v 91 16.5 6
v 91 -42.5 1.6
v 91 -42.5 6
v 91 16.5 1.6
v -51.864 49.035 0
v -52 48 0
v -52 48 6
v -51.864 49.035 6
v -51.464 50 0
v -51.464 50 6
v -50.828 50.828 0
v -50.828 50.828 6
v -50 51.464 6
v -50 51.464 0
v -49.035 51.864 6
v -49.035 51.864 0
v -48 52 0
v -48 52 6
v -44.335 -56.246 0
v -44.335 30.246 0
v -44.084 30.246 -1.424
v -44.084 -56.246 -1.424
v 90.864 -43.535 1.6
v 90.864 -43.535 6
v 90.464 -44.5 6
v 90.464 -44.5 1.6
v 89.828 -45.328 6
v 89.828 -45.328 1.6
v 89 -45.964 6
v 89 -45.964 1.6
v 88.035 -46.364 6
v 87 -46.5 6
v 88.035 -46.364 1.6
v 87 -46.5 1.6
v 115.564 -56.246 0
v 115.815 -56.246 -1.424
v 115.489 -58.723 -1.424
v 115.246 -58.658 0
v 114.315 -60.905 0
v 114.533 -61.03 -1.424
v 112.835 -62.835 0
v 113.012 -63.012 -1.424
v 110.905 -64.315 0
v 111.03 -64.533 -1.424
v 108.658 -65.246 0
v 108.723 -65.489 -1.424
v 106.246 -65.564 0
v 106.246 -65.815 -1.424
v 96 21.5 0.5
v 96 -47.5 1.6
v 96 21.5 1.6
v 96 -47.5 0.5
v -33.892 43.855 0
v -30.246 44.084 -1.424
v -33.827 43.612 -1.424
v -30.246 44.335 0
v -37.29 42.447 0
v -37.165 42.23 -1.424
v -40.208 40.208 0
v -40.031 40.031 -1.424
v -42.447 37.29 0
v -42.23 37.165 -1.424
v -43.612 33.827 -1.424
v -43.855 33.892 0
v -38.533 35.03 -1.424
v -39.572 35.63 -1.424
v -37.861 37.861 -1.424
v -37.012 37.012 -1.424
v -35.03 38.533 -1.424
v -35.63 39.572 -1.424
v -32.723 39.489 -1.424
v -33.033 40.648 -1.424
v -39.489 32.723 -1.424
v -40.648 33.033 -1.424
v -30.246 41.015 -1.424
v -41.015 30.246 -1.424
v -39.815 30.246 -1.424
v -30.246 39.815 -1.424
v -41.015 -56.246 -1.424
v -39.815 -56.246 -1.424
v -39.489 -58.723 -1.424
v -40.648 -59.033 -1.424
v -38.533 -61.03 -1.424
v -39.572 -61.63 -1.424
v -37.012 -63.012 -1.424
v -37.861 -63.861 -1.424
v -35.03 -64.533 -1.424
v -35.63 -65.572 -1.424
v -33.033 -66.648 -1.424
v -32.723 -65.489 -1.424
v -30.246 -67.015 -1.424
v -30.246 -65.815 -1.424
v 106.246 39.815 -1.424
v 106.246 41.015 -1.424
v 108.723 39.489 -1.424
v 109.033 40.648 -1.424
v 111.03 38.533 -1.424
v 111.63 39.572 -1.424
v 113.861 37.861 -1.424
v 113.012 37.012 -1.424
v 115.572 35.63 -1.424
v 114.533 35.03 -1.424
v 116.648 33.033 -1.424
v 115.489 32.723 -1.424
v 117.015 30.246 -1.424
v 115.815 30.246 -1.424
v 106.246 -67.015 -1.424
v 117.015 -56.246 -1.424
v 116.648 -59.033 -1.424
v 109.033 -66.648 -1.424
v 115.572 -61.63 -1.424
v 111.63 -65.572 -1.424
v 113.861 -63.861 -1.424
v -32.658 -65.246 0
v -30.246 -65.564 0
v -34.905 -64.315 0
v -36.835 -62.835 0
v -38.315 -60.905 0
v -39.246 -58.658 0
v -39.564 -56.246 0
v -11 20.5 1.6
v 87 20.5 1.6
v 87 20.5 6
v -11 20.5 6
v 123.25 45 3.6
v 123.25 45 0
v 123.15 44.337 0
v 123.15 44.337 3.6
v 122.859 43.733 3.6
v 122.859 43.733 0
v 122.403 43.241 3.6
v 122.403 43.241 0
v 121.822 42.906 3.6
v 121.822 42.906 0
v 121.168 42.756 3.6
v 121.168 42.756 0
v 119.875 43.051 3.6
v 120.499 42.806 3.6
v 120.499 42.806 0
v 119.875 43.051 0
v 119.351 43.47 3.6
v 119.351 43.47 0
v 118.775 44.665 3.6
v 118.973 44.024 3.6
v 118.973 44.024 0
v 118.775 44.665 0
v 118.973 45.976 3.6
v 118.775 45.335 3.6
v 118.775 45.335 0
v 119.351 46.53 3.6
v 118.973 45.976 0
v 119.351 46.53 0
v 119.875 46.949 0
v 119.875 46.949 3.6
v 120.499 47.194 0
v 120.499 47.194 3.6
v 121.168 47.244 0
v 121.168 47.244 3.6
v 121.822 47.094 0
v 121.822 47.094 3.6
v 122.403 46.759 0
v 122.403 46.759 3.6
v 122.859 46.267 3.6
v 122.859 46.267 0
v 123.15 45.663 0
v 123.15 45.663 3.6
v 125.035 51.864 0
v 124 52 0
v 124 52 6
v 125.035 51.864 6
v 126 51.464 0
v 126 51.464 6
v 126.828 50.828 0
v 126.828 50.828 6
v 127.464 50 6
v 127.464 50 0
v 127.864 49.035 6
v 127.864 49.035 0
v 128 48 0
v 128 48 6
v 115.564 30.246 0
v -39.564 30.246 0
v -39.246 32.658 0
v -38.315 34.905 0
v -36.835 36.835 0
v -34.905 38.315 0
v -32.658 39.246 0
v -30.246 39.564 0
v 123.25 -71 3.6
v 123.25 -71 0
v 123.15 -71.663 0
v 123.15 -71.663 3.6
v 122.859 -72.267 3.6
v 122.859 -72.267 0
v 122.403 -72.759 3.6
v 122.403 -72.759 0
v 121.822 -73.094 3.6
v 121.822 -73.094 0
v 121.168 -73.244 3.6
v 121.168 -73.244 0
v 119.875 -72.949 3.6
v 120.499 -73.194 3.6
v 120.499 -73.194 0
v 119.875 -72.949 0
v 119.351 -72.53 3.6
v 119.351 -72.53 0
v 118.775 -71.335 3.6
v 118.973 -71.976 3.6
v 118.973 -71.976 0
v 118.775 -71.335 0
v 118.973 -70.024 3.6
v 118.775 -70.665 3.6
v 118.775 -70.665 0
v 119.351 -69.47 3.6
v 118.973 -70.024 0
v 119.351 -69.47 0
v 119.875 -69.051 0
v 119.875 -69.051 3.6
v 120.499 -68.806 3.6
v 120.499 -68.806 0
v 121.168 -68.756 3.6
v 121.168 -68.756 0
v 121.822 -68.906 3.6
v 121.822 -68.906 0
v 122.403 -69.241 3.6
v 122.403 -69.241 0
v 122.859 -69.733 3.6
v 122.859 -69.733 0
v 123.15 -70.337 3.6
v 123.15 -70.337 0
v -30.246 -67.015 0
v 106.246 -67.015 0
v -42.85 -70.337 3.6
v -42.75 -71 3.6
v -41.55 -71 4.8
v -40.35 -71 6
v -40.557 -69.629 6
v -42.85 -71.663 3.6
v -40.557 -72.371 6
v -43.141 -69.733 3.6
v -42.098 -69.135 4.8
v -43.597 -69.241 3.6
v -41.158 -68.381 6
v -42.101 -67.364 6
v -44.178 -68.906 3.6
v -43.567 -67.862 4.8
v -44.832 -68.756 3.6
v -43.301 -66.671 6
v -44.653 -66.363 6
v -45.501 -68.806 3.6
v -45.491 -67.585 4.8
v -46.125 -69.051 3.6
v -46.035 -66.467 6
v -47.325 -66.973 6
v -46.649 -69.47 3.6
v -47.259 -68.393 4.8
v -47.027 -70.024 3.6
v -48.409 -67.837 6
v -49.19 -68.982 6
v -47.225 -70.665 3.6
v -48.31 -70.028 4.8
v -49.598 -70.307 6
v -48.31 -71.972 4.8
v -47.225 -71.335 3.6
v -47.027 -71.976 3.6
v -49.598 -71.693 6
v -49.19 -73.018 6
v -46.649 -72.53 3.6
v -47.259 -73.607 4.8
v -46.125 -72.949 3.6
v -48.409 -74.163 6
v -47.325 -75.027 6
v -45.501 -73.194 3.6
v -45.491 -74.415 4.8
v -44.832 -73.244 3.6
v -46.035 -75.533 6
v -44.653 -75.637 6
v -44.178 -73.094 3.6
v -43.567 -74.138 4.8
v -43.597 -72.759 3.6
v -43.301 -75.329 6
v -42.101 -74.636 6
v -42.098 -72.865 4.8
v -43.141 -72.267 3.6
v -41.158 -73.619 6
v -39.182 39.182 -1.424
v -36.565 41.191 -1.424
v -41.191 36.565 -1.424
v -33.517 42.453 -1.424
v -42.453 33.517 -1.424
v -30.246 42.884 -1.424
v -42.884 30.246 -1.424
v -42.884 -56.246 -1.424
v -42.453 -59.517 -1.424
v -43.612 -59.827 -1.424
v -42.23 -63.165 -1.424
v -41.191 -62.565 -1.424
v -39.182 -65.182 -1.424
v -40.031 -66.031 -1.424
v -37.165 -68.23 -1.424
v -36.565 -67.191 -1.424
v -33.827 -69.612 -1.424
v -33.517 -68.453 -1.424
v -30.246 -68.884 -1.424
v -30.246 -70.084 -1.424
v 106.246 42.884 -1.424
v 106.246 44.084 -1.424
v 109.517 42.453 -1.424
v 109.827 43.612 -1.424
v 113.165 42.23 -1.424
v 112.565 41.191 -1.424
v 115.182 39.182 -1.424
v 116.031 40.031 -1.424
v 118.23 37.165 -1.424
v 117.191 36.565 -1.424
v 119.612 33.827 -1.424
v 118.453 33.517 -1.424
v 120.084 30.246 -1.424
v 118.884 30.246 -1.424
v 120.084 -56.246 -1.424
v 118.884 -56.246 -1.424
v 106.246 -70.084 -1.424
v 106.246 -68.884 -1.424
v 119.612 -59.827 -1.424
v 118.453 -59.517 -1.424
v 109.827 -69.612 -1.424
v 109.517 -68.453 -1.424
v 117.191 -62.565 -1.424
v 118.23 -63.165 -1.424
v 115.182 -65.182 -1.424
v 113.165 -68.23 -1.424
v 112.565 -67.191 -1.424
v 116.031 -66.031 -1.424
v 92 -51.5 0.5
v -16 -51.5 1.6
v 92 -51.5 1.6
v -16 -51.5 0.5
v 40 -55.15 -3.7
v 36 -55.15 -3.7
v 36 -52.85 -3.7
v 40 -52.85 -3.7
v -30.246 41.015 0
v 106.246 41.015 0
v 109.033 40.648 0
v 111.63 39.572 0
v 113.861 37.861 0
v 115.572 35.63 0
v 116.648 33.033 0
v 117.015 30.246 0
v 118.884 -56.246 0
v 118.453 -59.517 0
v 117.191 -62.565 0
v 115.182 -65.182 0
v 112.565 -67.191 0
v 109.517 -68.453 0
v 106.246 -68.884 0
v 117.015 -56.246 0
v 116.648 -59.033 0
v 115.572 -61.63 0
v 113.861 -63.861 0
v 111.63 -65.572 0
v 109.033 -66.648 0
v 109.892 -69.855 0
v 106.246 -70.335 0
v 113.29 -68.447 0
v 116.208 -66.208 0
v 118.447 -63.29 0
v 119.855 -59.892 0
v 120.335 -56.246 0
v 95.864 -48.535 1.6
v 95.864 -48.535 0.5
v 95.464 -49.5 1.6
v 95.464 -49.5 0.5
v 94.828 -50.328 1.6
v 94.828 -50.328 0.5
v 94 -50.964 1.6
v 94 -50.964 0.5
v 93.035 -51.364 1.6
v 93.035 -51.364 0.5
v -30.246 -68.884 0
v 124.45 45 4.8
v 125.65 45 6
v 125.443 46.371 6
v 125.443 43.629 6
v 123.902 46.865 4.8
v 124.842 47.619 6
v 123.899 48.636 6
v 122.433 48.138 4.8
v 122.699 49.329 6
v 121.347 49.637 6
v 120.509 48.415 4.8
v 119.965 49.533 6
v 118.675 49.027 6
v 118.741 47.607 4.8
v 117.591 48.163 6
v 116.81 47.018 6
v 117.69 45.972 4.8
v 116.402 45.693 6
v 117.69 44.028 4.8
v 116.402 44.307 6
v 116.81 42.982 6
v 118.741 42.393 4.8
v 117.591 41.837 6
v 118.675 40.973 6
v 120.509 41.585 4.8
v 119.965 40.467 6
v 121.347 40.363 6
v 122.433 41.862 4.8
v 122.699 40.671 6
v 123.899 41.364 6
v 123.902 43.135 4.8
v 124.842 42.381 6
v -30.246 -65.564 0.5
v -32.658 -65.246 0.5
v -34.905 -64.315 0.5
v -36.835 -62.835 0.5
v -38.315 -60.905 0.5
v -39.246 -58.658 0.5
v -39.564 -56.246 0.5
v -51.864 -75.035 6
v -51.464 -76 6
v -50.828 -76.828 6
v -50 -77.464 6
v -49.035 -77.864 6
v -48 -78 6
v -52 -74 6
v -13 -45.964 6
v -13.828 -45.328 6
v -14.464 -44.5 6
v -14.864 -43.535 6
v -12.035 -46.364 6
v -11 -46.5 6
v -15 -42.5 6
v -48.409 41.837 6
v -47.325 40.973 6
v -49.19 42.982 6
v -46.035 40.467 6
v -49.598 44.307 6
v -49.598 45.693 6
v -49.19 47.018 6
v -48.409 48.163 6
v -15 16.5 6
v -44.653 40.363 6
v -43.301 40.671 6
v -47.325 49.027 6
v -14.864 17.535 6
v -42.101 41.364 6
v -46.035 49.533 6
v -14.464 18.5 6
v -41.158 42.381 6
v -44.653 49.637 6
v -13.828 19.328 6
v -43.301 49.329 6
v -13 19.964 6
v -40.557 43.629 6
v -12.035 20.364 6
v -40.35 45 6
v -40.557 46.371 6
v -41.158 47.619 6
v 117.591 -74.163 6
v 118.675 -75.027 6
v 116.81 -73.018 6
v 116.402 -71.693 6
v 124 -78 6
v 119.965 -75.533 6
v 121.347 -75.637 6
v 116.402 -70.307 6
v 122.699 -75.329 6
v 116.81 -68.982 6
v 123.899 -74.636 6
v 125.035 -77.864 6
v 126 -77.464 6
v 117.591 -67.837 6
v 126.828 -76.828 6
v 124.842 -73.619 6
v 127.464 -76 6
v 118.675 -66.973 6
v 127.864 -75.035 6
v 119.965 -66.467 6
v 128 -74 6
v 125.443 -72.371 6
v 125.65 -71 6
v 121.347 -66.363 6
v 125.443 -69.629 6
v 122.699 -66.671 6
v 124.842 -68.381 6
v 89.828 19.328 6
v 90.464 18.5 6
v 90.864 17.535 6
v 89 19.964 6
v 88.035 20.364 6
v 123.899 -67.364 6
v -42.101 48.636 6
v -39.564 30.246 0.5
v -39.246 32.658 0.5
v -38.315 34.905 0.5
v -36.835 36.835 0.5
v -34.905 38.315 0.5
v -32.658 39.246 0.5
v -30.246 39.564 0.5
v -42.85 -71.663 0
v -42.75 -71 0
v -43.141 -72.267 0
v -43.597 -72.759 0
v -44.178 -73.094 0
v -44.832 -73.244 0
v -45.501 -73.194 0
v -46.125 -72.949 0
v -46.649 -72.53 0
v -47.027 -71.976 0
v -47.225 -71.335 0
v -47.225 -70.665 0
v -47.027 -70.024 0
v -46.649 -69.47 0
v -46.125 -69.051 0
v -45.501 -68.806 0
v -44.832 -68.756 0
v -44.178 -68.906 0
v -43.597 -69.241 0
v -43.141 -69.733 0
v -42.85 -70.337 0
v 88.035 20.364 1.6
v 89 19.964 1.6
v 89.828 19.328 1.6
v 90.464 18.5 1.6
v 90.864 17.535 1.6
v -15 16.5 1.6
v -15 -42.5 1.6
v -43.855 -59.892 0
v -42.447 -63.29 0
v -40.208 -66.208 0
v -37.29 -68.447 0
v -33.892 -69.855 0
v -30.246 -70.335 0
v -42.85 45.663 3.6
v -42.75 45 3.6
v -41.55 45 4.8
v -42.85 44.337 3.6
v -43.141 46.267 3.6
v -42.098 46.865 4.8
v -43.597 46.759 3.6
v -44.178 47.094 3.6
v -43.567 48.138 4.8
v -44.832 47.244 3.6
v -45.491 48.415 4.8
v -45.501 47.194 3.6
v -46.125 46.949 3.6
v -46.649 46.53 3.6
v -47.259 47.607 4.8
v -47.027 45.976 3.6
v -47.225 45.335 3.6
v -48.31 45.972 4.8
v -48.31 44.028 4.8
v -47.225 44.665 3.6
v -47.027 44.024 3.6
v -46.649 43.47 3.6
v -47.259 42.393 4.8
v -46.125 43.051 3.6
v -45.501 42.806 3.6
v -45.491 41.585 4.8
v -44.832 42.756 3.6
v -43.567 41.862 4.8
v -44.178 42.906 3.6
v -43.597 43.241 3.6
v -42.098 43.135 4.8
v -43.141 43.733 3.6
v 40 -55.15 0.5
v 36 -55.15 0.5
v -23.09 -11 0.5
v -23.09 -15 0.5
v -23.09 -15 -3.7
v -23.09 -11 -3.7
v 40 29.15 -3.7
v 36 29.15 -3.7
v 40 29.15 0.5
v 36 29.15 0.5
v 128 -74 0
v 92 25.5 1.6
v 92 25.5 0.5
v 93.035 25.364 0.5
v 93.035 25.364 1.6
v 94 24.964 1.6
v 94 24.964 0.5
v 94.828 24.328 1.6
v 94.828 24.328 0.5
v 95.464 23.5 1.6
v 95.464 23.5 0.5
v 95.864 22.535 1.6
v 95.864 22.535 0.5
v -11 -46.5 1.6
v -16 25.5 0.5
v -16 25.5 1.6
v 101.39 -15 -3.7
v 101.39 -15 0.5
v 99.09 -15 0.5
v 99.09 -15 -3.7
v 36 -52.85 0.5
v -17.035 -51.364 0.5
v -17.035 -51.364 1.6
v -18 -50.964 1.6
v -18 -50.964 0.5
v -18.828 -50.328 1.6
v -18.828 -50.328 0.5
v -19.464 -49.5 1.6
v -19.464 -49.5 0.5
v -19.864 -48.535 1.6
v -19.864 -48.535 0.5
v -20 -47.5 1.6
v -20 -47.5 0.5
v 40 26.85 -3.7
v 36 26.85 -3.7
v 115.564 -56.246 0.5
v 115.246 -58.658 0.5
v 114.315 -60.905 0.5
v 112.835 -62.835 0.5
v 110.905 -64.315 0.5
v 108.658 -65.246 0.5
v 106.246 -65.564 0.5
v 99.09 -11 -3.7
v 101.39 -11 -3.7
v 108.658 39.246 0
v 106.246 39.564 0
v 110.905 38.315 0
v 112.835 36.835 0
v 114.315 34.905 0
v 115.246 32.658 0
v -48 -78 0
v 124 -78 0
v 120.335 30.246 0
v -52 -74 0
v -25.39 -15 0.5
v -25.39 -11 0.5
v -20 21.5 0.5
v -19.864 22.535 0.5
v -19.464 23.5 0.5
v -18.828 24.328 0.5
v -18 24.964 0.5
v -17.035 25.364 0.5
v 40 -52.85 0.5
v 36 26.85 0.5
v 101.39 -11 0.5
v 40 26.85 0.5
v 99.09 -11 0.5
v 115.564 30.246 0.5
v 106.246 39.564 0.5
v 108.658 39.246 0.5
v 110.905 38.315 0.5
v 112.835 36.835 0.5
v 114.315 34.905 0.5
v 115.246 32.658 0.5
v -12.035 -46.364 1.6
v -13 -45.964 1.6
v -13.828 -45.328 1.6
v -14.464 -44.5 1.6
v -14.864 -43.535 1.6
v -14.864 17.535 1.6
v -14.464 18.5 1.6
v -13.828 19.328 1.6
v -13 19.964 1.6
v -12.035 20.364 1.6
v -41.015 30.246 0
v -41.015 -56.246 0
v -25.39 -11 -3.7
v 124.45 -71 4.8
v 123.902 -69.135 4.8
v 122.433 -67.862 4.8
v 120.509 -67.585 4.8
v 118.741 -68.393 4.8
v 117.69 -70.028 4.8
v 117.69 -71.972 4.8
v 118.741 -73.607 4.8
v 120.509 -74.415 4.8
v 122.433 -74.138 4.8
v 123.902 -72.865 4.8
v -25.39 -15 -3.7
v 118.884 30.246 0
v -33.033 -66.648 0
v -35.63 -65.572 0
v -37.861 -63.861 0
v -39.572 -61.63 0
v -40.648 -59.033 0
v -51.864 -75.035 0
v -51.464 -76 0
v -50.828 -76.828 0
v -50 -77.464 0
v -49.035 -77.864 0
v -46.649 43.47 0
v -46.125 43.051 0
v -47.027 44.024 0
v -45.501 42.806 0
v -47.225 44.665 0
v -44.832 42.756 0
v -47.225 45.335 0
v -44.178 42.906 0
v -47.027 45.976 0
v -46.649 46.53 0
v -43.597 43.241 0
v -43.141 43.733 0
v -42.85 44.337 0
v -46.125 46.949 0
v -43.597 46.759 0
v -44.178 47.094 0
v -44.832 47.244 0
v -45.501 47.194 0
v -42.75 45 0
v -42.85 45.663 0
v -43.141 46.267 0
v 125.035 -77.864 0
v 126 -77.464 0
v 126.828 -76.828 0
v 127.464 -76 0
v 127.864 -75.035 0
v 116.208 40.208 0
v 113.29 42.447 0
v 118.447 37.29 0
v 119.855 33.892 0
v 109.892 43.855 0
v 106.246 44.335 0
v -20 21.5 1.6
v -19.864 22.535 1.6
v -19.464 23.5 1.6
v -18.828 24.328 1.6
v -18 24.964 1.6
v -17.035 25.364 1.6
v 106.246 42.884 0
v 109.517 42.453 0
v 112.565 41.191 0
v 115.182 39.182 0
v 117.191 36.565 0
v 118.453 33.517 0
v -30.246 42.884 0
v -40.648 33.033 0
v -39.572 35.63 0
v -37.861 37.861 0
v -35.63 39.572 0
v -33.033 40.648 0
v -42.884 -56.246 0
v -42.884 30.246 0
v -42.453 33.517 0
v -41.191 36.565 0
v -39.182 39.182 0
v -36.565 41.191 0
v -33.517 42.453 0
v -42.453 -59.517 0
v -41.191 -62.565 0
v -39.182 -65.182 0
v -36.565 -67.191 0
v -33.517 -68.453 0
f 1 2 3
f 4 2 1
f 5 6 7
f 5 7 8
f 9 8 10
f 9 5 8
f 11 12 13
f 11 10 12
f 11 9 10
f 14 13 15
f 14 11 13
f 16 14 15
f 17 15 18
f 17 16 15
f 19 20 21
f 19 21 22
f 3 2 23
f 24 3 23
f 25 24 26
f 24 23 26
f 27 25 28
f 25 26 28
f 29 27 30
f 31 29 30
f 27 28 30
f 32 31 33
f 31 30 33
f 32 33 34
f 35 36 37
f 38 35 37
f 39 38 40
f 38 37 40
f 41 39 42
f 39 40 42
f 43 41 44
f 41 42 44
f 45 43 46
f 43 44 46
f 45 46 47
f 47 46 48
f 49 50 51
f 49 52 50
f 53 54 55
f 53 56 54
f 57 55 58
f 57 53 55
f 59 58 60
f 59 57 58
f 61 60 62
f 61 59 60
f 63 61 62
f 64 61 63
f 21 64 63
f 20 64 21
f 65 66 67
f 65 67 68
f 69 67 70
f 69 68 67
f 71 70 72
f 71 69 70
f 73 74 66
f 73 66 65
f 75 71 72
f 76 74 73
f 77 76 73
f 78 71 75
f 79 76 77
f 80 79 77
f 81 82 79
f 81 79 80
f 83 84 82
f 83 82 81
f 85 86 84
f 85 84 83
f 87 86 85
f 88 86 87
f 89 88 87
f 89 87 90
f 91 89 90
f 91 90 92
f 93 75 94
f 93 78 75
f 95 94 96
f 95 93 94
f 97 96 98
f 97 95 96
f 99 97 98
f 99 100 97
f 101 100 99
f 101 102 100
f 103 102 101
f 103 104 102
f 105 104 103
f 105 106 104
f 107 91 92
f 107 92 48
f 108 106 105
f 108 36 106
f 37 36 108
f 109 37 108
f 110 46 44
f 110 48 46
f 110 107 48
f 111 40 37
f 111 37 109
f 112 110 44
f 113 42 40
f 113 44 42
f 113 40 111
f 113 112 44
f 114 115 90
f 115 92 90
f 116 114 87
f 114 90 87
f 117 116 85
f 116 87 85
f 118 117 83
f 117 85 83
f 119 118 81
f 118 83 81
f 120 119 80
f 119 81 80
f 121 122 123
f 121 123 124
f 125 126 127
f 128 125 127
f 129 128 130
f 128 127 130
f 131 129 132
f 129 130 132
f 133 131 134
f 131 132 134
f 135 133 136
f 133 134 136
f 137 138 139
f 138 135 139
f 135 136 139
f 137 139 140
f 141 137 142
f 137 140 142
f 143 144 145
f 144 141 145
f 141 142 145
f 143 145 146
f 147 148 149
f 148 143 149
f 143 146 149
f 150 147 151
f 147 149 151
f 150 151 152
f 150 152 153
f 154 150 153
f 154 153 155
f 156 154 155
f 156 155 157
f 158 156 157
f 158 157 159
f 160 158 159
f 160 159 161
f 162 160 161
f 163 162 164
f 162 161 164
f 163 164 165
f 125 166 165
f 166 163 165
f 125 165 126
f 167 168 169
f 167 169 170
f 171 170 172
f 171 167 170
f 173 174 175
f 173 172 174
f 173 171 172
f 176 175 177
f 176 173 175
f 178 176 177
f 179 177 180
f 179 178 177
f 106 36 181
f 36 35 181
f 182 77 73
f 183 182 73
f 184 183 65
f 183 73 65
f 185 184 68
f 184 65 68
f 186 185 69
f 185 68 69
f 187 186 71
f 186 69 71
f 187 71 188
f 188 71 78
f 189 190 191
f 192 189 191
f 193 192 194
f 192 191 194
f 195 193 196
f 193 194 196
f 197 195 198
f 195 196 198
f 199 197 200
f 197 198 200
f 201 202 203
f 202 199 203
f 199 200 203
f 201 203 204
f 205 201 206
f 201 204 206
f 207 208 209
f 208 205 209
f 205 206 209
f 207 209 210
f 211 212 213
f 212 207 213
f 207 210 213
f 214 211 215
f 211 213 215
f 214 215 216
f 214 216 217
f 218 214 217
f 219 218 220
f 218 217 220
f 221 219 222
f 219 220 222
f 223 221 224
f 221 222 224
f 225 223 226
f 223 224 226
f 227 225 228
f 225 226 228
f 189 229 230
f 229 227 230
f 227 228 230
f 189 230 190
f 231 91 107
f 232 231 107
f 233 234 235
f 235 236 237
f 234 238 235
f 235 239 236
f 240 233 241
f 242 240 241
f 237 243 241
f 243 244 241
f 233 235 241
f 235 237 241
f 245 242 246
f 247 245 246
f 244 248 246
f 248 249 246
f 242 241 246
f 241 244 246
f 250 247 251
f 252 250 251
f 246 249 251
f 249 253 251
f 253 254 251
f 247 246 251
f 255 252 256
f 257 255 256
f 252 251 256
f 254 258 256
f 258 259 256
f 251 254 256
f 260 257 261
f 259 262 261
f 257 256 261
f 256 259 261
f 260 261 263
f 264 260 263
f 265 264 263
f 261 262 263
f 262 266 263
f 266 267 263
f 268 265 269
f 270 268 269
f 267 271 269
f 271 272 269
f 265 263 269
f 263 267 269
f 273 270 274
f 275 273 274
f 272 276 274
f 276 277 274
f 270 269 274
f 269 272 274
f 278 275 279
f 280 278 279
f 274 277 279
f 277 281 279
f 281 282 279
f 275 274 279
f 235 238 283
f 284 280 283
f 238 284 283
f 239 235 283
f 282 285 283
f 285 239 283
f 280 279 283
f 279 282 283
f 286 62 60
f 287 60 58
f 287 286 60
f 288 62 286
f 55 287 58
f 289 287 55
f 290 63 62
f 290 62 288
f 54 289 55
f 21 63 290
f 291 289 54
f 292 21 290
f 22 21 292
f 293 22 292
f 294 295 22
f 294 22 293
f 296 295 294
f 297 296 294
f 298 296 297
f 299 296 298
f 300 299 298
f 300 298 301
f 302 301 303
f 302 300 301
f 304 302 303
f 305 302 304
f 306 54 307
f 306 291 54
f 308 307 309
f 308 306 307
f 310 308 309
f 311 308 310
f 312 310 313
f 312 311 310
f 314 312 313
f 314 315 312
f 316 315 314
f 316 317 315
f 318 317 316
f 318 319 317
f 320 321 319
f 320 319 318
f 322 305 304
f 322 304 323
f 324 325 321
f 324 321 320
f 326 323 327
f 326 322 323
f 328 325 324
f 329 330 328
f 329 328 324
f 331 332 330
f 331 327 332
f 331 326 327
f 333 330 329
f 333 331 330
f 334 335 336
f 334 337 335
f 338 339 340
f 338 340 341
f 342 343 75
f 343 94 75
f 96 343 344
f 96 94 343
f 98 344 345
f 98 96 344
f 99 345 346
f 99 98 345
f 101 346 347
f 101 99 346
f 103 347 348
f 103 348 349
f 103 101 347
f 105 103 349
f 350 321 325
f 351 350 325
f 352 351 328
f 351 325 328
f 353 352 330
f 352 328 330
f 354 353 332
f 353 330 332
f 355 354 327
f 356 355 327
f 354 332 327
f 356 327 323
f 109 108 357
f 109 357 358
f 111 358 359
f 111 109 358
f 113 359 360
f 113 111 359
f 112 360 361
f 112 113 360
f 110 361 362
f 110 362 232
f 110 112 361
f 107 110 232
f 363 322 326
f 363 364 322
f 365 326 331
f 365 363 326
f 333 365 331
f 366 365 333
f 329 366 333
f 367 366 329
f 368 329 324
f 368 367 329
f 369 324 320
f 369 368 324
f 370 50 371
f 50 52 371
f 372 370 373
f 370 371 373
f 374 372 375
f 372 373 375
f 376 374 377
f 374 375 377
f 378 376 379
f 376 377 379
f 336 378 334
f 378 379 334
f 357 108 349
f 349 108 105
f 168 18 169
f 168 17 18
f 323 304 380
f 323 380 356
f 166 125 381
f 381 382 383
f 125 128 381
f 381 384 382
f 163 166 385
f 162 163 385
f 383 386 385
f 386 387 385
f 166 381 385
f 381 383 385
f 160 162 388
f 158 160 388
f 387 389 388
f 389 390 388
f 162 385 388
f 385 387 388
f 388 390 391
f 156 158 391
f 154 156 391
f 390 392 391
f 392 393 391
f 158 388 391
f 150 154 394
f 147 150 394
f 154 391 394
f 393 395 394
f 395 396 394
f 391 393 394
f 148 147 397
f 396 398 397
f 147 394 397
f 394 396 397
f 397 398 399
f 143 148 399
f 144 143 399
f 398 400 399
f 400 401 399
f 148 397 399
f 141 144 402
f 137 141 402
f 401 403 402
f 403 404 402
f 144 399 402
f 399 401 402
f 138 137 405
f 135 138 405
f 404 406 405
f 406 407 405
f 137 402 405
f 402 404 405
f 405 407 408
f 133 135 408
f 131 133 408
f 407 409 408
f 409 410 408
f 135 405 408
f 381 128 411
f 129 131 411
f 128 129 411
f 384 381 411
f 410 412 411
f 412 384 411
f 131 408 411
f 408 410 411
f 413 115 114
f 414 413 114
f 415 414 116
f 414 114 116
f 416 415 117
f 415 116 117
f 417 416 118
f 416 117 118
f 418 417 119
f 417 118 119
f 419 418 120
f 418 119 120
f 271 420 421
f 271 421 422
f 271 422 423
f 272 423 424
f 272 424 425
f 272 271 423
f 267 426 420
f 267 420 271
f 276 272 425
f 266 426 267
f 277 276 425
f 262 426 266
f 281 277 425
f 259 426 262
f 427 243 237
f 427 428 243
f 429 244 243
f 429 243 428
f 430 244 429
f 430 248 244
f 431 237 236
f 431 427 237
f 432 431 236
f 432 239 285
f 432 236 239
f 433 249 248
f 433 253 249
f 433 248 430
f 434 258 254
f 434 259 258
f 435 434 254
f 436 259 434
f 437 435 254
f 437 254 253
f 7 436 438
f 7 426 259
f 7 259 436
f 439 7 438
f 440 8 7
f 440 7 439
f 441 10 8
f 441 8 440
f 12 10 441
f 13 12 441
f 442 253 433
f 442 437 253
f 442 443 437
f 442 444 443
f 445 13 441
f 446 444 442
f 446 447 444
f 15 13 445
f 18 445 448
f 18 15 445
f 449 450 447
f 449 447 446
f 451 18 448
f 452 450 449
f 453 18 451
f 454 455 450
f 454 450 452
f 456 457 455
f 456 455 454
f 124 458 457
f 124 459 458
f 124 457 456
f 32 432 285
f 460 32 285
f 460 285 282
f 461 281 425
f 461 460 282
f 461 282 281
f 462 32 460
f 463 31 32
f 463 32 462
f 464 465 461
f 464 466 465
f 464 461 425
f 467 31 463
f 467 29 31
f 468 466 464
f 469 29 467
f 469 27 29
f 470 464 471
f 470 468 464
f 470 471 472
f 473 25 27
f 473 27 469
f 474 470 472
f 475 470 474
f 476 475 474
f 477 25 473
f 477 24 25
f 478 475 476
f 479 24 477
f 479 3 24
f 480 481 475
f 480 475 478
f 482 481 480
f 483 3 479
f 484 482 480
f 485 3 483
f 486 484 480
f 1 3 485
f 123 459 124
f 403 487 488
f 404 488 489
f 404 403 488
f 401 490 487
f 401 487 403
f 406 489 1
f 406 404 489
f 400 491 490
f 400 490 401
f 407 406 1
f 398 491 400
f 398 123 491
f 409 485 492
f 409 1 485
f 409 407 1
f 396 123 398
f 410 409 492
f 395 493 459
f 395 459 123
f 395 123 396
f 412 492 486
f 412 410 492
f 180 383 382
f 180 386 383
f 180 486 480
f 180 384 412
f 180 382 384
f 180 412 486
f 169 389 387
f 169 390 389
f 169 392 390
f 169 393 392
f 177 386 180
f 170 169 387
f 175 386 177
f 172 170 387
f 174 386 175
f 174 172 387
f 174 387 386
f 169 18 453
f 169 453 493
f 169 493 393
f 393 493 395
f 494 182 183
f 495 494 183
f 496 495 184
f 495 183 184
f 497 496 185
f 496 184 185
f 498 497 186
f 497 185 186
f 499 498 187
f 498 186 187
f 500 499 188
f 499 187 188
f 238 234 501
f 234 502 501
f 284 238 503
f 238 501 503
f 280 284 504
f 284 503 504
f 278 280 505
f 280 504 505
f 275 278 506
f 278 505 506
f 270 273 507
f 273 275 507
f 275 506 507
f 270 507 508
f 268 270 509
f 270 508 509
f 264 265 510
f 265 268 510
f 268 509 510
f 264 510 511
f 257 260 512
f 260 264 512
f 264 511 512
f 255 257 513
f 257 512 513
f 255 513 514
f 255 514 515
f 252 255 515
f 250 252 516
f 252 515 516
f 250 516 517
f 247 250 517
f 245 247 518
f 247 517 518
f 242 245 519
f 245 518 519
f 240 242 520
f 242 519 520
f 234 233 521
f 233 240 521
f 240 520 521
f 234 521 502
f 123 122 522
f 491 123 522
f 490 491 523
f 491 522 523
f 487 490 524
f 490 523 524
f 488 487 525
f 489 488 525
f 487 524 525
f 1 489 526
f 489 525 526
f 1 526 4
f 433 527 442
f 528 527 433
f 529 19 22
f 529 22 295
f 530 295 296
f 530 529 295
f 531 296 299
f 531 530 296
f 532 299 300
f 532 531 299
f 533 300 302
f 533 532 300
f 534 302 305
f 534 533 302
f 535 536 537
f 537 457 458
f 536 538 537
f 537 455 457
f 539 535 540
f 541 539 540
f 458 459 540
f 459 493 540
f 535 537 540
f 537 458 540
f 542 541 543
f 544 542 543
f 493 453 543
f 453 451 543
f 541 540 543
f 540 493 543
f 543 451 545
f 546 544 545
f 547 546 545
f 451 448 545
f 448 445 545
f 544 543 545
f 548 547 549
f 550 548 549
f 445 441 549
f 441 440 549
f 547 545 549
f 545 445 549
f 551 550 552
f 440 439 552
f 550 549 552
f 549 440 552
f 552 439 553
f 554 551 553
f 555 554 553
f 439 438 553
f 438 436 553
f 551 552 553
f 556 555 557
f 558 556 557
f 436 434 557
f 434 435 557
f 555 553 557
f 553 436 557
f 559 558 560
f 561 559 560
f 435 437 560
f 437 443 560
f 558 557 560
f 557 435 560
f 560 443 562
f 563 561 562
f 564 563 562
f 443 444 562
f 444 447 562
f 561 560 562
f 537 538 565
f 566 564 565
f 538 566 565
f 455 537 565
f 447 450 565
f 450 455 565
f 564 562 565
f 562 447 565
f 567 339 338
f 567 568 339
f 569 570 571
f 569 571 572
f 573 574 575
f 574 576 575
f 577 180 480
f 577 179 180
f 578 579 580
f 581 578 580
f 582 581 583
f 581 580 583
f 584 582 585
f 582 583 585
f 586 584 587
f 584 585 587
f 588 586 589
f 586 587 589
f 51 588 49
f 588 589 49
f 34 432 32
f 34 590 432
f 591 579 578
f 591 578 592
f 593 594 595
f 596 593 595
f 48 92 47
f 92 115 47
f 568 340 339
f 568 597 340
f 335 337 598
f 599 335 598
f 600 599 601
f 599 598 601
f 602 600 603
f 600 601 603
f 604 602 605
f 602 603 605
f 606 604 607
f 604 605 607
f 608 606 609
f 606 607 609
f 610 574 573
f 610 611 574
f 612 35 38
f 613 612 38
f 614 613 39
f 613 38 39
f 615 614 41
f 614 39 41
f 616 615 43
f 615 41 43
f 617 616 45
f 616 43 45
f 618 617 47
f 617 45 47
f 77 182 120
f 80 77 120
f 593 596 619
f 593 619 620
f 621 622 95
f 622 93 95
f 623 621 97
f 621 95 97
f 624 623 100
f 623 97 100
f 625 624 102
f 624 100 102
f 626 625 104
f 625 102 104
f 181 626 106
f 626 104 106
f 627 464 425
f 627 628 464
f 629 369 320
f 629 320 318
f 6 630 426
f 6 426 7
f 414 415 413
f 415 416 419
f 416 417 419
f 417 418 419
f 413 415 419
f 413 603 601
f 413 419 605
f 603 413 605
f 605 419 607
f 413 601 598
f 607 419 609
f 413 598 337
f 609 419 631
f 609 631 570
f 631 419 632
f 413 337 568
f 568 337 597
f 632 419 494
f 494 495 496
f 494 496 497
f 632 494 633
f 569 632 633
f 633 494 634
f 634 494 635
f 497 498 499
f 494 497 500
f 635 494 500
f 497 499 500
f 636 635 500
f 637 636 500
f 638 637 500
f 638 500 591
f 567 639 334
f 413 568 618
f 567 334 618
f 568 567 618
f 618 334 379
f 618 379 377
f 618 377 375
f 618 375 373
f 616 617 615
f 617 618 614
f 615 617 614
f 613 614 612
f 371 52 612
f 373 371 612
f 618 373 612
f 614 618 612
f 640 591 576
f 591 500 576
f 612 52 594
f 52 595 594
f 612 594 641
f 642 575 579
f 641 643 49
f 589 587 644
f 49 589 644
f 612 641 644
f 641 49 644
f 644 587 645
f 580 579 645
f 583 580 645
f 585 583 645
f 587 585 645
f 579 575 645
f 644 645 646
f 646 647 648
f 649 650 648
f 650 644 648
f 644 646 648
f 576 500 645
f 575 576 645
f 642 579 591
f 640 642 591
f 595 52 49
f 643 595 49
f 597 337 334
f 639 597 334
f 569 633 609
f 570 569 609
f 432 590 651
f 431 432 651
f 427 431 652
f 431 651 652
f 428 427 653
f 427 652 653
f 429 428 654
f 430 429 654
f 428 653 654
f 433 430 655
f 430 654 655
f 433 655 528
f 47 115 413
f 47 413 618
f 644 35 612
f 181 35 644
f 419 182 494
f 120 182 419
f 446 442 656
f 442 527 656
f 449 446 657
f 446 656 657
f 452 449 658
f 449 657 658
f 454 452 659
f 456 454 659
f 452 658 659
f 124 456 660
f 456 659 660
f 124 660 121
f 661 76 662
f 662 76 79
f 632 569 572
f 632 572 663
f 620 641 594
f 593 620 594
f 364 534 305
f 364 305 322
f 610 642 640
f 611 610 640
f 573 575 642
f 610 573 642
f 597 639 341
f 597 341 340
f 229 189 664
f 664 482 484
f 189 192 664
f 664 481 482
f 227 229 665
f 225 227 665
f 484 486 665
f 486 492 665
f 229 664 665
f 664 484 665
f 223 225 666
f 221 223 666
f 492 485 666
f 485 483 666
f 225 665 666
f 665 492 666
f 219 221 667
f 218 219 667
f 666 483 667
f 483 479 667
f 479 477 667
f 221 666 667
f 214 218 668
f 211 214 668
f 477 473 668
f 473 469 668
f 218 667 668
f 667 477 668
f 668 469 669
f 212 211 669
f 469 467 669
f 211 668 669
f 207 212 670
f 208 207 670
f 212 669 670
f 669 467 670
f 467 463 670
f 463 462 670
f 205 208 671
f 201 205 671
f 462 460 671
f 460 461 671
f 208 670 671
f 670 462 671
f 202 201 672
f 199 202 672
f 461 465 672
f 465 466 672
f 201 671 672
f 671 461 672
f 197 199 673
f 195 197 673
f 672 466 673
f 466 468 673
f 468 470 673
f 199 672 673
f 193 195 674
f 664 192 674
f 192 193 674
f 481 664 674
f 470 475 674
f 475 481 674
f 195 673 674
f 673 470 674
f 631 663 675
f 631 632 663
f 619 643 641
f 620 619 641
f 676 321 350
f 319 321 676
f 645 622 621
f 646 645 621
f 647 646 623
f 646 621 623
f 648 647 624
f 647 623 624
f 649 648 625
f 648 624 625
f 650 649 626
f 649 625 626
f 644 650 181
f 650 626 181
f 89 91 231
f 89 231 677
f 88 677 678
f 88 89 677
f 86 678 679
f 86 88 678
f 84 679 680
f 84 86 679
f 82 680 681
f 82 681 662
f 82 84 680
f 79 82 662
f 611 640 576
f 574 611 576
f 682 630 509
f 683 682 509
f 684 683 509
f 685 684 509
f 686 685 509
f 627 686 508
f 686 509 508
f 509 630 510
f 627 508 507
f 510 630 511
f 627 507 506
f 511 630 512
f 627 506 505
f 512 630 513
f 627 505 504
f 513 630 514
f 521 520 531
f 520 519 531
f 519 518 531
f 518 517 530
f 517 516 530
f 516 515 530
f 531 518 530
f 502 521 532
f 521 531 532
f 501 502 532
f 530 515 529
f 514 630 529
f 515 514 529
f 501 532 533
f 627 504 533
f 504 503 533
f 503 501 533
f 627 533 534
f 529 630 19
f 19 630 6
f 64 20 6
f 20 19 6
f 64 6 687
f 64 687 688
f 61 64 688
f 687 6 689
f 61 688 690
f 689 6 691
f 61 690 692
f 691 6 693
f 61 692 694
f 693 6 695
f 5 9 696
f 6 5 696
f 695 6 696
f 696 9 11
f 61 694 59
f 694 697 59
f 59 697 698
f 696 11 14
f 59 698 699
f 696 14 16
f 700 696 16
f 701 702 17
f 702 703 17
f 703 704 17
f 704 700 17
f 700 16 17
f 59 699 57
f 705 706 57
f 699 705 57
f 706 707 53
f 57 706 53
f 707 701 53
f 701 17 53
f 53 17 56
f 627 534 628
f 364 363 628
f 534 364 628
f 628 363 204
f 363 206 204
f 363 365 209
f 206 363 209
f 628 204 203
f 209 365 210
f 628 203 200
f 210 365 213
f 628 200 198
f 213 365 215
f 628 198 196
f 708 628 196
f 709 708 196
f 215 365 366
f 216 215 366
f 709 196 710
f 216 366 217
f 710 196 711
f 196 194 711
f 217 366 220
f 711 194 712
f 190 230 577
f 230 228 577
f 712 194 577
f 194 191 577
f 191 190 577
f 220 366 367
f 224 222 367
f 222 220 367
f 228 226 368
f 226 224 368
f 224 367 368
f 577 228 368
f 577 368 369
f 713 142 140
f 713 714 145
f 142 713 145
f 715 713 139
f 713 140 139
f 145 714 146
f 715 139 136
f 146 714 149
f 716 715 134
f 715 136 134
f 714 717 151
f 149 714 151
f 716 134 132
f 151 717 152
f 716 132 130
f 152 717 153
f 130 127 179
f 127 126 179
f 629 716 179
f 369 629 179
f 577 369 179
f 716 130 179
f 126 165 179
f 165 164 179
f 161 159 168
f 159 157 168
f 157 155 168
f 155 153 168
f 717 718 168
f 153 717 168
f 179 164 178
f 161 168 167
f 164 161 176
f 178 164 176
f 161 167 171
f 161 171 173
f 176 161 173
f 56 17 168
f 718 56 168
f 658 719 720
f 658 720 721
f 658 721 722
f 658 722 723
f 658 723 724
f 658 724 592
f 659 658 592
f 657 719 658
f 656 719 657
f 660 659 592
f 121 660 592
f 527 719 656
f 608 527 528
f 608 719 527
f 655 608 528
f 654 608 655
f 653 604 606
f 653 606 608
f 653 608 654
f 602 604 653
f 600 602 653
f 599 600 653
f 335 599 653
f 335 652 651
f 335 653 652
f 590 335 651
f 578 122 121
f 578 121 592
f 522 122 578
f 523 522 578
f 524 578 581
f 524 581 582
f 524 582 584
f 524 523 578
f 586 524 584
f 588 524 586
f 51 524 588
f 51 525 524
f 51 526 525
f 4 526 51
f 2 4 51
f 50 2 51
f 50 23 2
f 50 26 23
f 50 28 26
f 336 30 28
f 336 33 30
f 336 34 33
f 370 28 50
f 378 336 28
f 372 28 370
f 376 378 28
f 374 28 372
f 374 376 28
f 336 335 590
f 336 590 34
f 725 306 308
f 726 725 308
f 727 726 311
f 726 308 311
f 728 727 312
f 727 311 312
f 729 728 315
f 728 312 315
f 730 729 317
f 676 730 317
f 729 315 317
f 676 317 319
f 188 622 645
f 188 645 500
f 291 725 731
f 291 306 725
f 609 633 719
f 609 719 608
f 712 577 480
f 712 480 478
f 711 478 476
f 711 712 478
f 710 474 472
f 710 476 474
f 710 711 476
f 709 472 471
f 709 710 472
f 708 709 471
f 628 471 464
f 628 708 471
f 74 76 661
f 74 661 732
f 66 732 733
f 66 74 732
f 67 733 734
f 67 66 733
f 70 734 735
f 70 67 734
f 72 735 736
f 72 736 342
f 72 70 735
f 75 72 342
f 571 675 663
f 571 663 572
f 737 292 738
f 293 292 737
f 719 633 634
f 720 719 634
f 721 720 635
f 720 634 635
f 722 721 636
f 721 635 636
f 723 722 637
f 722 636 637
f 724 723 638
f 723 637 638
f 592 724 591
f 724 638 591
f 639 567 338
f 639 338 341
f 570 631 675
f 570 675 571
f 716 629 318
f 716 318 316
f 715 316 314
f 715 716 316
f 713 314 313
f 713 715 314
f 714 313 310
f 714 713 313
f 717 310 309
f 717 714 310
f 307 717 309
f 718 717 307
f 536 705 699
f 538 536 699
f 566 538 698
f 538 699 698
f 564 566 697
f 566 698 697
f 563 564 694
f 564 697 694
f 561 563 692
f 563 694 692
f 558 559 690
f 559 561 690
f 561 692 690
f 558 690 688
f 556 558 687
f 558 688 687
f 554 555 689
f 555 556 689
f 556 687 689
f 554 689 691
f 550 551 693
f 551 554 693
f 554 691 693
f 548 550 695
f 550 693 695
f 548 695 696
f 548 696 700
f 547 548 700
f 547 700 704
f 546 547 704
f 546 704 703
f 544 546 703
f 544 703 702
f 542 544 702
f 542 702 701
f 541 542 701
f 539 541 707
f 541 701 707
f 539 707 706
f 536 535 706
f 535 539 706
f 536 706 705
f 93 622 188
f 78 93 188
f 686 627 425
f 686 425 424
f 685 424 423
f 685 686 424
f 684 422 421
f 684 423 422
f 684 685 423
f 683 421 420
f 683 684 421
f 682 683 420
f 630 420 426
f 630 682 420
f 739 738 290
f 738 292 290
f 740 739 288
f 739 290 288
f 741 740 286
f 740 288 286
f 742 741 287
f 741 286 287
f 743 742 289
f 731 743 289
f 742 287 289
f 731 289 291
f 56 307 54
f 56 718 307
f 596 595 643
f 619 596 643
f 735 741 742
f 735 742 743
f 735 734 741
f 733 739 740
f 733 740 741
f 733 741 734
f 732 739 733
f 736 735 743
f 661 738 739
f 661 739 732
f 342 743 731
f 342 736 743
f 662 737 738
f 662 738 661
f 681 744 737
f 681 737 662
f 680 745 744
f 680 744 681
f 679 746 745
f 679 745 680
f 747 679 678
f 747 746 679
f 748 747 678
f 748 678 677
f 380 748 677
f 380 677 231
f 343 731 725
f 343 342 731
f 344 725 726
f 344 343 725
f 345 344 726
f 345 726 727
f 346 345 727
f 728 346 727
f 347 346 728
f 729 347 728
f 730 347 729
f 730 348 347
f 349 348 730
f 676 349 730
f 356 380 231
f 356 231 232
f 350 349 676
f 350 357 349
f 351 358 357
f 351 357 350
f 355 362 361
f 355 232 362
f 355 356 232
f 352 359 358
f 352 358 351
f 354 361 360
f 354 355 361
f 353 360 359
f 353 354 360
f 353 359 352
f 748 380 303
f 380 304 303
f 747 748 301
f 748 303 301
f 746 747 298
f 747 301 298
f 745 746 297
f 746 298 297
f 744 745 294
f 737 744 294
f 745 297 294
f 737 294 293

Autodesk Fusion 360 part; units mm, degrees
sketch "Sketch2" plane through (0, 0, 0) normal (0, 0, 1) x (1, 0, 0)
  line L0 (-48, 52) -> (124, 52)
  line L1 (128, 48) -> (128, -74)
  line L2 (124, -78) -> (-48, -78)
  line L3 (-52, -74) -> (-52, 48)
  circle A0 centre (-45, 45) radius 2.25
  line L4 (38, -78) -> (38, 52) construction
  line L5 (-52, -13) -> (128, -13) construction
  arc A1 (-48, 52) -> (-52, 48) centre (-48, 48) ccw
  circle A2 centre (121, 45) radius 2.25
  arc A3 (128, 48) -> (124, 52) centre (124, 48) ccw
  circle A4 centre (121, -71) radius 2.25
  arc A5 (124, -78) -> (128, -74) centre (124, -74) ccw
  circle A6 centre (-45, -71) radius 2.25
  arc A7 (-52, -74) -> (-48, -78) centre (-48, -74) ccw
  point P0 (-52, 52)
  point P1 (128, 52)
  dimension "d3" = 4.5
  dimension "d4" = 7
  dimension "d5" = 7
  dimension "d6" = 4
  dimension "d63" = 180
  dimension "d64" = 130
extrude "Extrude1" add sketch "Sketch2" along normal blind 6
sketch "Sketch3" plane through (0, 0, 0) normal (0, 0, -1) x (1, 0, 0)
  circle A0 centre (121, 71) radius 2.25
  circle A1 centre (-45, 71) radius 2.25
  circle A2 centre (-45, -45) radius 2.25
  circle A3 centre (121, -45) radius 2.25
  arc A4 (-52, -48) -> (-48, -52) centre (-48, -48) ccw
  line L0 (-48, -52) -> (124, -52)
  arc A5 (124, -52) -> (128, -48) centre (124, -48) ccw
  line L1 (128, -48) -> (128, 74)
  arc A6 (128, 74) -> (124, 78) centre (124, 74) ccw
  line L2 (124, 78) -> (-48, 78)
  arc A7 (-48, 78) -> (-52, 74) centre (-48, 74) ccw
  line L3 (-52, 74) -> (-52, -48)
  line L4 (38, 78) -> (38, -52) construction
  line L5 (128, 13) -> (-52, 13) construction
  line L6 (117.9494, -41.9494) -> (-41.9494, -41.9494) construction
  line L7 (-41.9494, -41.9494) -> (-41.9494, 67.9494) construction
  line L8 (-41.9494, 67.9494) -> (117.9494, 67.9494) construction
  line L9 (117.9494, 67.9494) -> (117.9494, -41.9494) construction
  line L10 (117.9494, -41.9494) -> (-41.9494, 67.9494) construction
  line L11 (-41.9494, -41.9494) -> (117.9494, 67.9494) construction
  line L12 (106.2459, -44.0839) -> (-30.2459, -44.0839)
  line L13 (-44.0839, -30.2459) -> (-44.0839, 56.2459)
  line L14 (-30.2459, 70.0839) -> (106.2459, 70.0839)
  line L15 (120.0839, 56.2459) -> (120.0839, -30.2459)
  line L16 (93.976, -25.9276) -> (-44.0839, 70.0839) construction
  line L17 (-38.2879, -33.8258) -> (83.9414, 41.199) construction
  line L18 (-39.8149, -30.2459) -> (-39.8149, 56.2459)
  line L19 (-30.2459, 65.8149) -> (106.2459, 65.8149)
  line L20 (115.8149, 56.2459) -> (115.8149, -30.2459)
  line L21 (103.0391, -31.1436) -> (-39.8149, 65.8149) construction
  line L22 (-35.6113, -30.989) -> (81.1607, 38.7921) construction
  arc A8 (-30.2459, 65.8149) -> (-39.8149, 56.2459) centre (-30.2459, 56.2459) ccw
  arc A9 (-30.2459, 70.0839) -> (-44.0839, 56.2459) centre (-30.2459, 56.2459) ccw
  arc A10 (115.8149, 56.2459) -> (106.2459, 65.8149) centre (106.2459, 56.2459) ccw
  arc A11 (120.0839, 56.2459) -> (106.2459, 70.0839) centre (106.2459, 56.2459) ccw
  arc A12 (-39.8149, -30.2459) -> (-30.2459, -39.8149) centre (-30.2459, -30.2459) ccw
  arc A13 (-44.0839, -30.2459) -> (-30.2459, -44.0839) centre (-30.2459, -30.2459) ccw
  arc A14 (106.2459, -39.8149) -> (115.8149, -30.2459) centre (106.2459, -30.2459) ccw
  arc A15 (106.2459, -44.0839) -> (120.0839, -30.2459) centre (106.2459, -30.2459) ccw
  line L23 (106.2459, -39.8149) -> (-30.2459, -39.8149)
  point P0 (38, 13)
  point P1 (38, 13)
  point P2 (38, 13)
  point P3 (38, 13)
  point P4 (38, 13)
  dimension "d25" = 159.8988
  dimension "d27" = 109.8988
  dimension "d28" = 2.1345
  dimension "d29" = 2.1345
  dimension "d30" = 2.1345
  dimension "d31" = 2.1345
  dimension "d44" = 9.569
  dimension "d45" = 13.838
extrude "Extrude4" add sketch "Sketch3" along normal blind 1.424 contours L12 L13 L14 L15 A9 A11 A13 A15
draft "Draft3" angle 10 neutral plane through (0, 0, -1.424) pull (0, 0, -1) 16 faces at (60.7486, -65.8149, -0.9493) (109.3756, -65.2886, -0.9493) (115.8149, -27.4153, -0.4747) (108.5019, 39.5452, -0.9493) (60.7486, 39.8149, -0.4747) (-38.5329, 35.0304, -0.9493) (-39.8149, -27.4153, -0.4747) (-32.5019, -65.5452, -0.9493) (-44.0839, 1.4153, -0.4747) (-35.389, 43.0927, -0.9493) (15.2514, 44.0839, -0.9493) (116.2609, 39.7952, -0.9493) (120.0839, 1.4153, -0.9493) (108.8648, -69.8338, -0.9493) (60.7486, -70.0839, -0.9493) (-44.0213, -57.5613, -0.4747)
sketch "Sketch5" plane through (0, 0, -1.424) normal (0, 0, -1) x (1, 0, 0)
  line L0 (-30.2459, 65.8149) -> (106.2459, 65.8149)
  line L1 (115.8149, 56.2459) -> (115.8149, -30.2459)
  line L2 (106.2459, -39.8149) -> (-30.2459, -39.8149)
  line L3 (-39.8149, -30.2459) -> (-39.8149, 56.2459)
  line L4 (106.2459, 70.0839) -> (-30.2459, 70.0839)
  line L5 (-44.0839, 56.2459) -> (-44.0839, -30.2459)
  line L6 (-30.2459, -44.0839) -> (106.2459, -44.0839)
  line L7 (120.0839, -30.2459) -> (120.0839, 56.2459)
  line L8 (38, 70.0839) -> (38, -44.0839) construction
  line L9 (120.0839, 13) -> (-44.0839, 13) construction
  line L10 (117.9494, -41.9494) -> (-41.9494, -41.9494) construction
  line L11 (-41.9494, -41.9494) -> (-41.9494, 67.9494) construction
  line L12 (-41.9494, 67.9494) -> (117.9494, 67.9494) construction
  line L13 (117.9494, 67.9494) -> (117.9494, -41.9494) construction
  line L14 (117.9494, -41.9494) -> (-41.9494, 67.9494) construction
  line L15 (-41.9494, -41.9494) -> (117.9494, 67.9494) construction
  line L16 (106.2459, -42.8839) -> (-30.2459, -42.8839)
  line L17 (-42.8839, -30.2459) -> (-42.8839, 56.2459)
  line L18 (-30.2459, 68.8839) -> (106.2459, 68.8839)
  line L19 (118.8839, 56.2459) -> (118.8839, -30.2459)
  line L20 (96.0985, -27.1411) -> (-42.8839, 68.8839) construction
  line L21 (-42.8839, -42.8839) -> (96.0985, 53.1411) construction
  line L22 (106.2459, -41.0149) -> (-30.2459, -41.0149)
  line L23 (-41.0149, -30.2459) -> (-41.0149, 56.2459)
  line L24 (117.0149, 56.2459) -> (117.0149, -30.2459)
  line L25 (95.1479, -26.0666) -> (-41.0149, 67.0149) construction
  line L26 (-41.0149, -41.0149) -> (95.1479, 52.0666) construction
  arc A0 (115.8149, 56.2459) -> (106.2459, 65.8149) centre (106.2459, 56.2459) ccw
  arc A1 (106.2459, -39.8149) -> (115.8149, -30.2459) centre (106.2459, -30.2459) ccw
  arc A2 (-39.8149, -30.2459) -> (-30.2459, -39.8149) centre (-30.2459, -30.2459) ccw
  arc A3 (-30.2459, 65.8149) -> (-39.8149, 56.2459) centre (-30.2459, 56.2459) ccw
  arc A4 (-44.0839, -30.2459) -> (-30.2459, -44.0839) centre (-30.2459, -30.2459) ccw
  arc A5 (106.2459, -44.0839) -> (120.0839, -30.2459) centre (106.2459, -30.2459) ccw
  arc A6 (120.0839, 56.2459) -> (106.2459, 70.0839) centre (106.2459, 56.2459) ccw
  arc A7 (-30.2459, 70.0839) -> (-44.0839, 56.2459) centre (-30.2459, 56.2459) ccw
  arc A8 (-30.2459, 67.0149) -> (-41.0149, 56.2459) centre (-30.2459, 56.2459) ccw
  arc A9 (-30.2459, 68.8839) -> (-42.8839, 56.2459) centre (-30.2459, 56.2459) ccw
  arc A10 (117.0149, 56.2459) -> (106.2459, 67.0149) centre (106.2459, 56.2459) ccw
  arc A11 (118.8839, 56.2459) -> (106.2459, 68.8839) centre (106.2459, 56.2459) ccw
  line L27 (-30.2459, 67.0149) -> (106.2459, 67.0149)
  arc A12 (106.2459, -41.0149) -> (117.0149, -30.2459) centre (106.2459, -30.2459) ccw
  arc A13 (106.2459, -42.8839) -> (118.8839, -30.2459) centre (106.2459, -30.2459) ccw
  arc A14 (-41.0149, -30.2459) -> (-30.2459, -41.0149) centre (-30.2459, -30.2459) ccw
  arc A15 (-42.8839, -30.2459) -> (-30.2459, -42.8839) centre (-30.2459, -30.2459) ccw
  point P0 (38, 13)
  point P1 (38, 13)
  point P2 (38, 13)
  dimension "d36" = 159.8988
  dimension "d37" = 109.8988
  dimension "d38" = 0.9345
  dimension "d39" = 0.9345
  dimension "d40" = 0.9345
  dimension "d41" = 0.9345
  dimension "d50" = 10.769
  dimension "d51" = 12.638
extrude "Extrude6" cut sketch "Sketch5" against normal blind 1.424 contours L16 L17 L18 L19 A9 A11 A13 A15
extrude "Extrude7" cut 1 faces at (15.2514, -30.5213, 0) along direction (0, 0, 1) blind 0.5
sketch "Sketch6" plane through (0, 0, 0.5) normal (0, 0, -1) x (1, 0, 0)
  line L0 (106.2459, 65.5638) -> (-30.2459, 65.5638)
  arc A0 (-30.2459, 65.5638) -> (-39.5638, 56.2459) centre (-30.2459, 56.2459) ccw
  line L1 (-39.5638, 56.2459) -> (-39.5638, -30.2459)
  arc A1 (-39.5638, -30.2459) -> (-30.2459, -39.5638) centre (-30.2459, -30.2459) ccw
  line L2 (-30.2459, -39.5638) -> (106.2459, -39.5638)
  arc A2 (106.2459, -39.5638) -> (115.5638, -30.2459) centre (106.2459, -30.2459) ccw
  line L3 (115.5638, -30.2459) -> (115.5638, 56.2459)
  arc A3 (115.5638, 56.2459) -> (106.2459, 65.5638) centre (106.2459, 56.2459) ccw
  line L4 (38, 65.5638) -> (38, -39.5638) construction
  line L5 (-39.5638, 13) -> (115.5638, 13) construction
  line L6 (92, -25.5) -> (-16, -25.5)
  line L7 (-20, -21.5) -> (-20, 47.5)
  line L8 (-16, 51.5) -> (92, 51.5)
  line L9 (96, 47.5) -> (96, -21.5)
  line L10 (96, -25.5) -> (-20, 51.5) construction
  line L11 (-20, -25.5) -> (96, 51.5) construction
  arc A4 (-16, 51.5) -> (-20, 47.5) centre (-16, 47.5) ccw
  arc A5 (96, 47.5) -> (92, 51.5) centre (92, 47.5) ccw
  arc A6 (92, -25.5) -> (96, -21.5) centre (92, -21.5) ccw
  arc A7 (-20, -21.5) -> (-16, -25.5) centre (-16, -21.5) ccw
  point P0 (38, 13)
  dimension "d58" = 116
  dimension "d59" = 77
  dimension "d68" = 4
  dimension "d69" = 4
  dimension "d70" = 4
  dimension "d71" = 4
extrude "Extrude8" cut sketch "Sketch6" against normal blind 1.1 contours L6 L7 L8 L9 A4 A5 A6 A7
sketch "Sketch7" plane through (0, 0, 1.6) normal (0, 0, -1) x (1, 0, 0)
  line L0 (92, 51.5) -> (-16, 51.5)
  line L1 (-20, 47.5) -> (-20, -21.5)
  line L2 (-16, -25.5) -> (92, -25.5)
  line L3 (96, -21.5) -> (96, 47.5)
  line L4 (38, 51.5) -> (38, -25.5) construction
  line L5 (96, 13) -> (-20, 13) construction
  line L6 (87, -20.5) -> (-11, -20.5)
  line L7 (-15, -16.5) -> (-15, 42.5)
  line L8 (-11, 46.5) -> (87, 46.5)
  line L9 (91, 42.5) -> (91, -16.5)
  line L10 (91, -20.5) -> (-15, 46.5) construction
  line L11 (-15, -20.5) -> (91, 46.5) construction
  arc A0 (-16, 51.5) -> (-20, 47.5) centre (-16, 47.5) ccw
  arc A1 (-20, -21.5) -> (-16, -25.5) centre (-16, -21.5) ccw
  arc A2 (92, -25.5) -> (96, -21.5) centre (92, -21.5) ccw
  arc A3 (96, 47.5) -> (92, 51.5) centre (92, 47.5) ccw
  arc A4 (-11, 46.5) -> (-15, 42.5) centre (-11, 42.5) ccw
  arc A5 (91, 42.5) -> (87, 46.5) centre (87, 42.5) ccw
  arc A6 (87, -20.5) -> (91, -16.5) centre (87, -16.5) ccw
  arc A7 (-15, -16.5) -> (-11, -20.5) centre (-11, -16.5) ccw
  point P0 (38, 13)
  dimension "d62" = 106
  dimension "d65" = 67
  dimension "d72" = 4
  dimension "d73" = 4
  dimension "d74" = 4
  dimension "d75" = 4
extrude "Extrude9" cut sketch "Sketch7" against normal blind 8.4 contours L6 L7 L8 L9 A4 A5 A6 A7
sketch "Sketch9" plane through (0, 0, 6) normal (0, 0, 1) x (-1, 0, 0)
  line L0 (15, 42.5) -> (15, -16.5)
  arc A0 (11, -20.5) -> (15, -16.5) centre (11, -16.5) ccw
  line L1 (11, -20.5) -> (-87, -20.5)
  arc A1 (-91, -16.5) -> (-87, -20.5) centre (-87, -16.5) ccw
  line L2 (-91, -16.5) -> (-91, 42.5)
  arc A2 (-87, 46.5) -> (-91, 42.5) centre (-87, 42.5) ccw
  line L3 (-87, 46.5) -> (11, 46.5)
  arc A3 (15, 42.5) -> (11, 46.5) centre (11, 42.5) ccw
  circle A4 centre (-121, 71) radius 2.25
  circle A5 centre (-121, -45) radius 2.25
  circle A6 centre (45, 71) radius 2.25
  circle A7 centre (45, -45) radius 2.25
  arc A8 (48, -52) -> (52, -48) centre (48, -48) ccw
  line L4 (52, -48) -> (52, 74)
  arc A9 (52, 74) -> (48, 78) centre (48, 74) ccw
  line L5 (48, 78) -> (-124, 78)
  arc A10 (-124, 78) -> (-128, 74) centre (-124, 74) ccw
  line L6 (-128, 74) -> (-128, -48)
  arc A11 (-128, -48) -> (-124, -52) centre (-124, -48) ccw
  line L7 (-124, -52) -> (48, -52)
  line L8 (45, -47.25) -> (45, -42.75) construction
  line L9 (42.75, -45) -> (47.25, -45) construction
  circle A12 centre (45, -45) radius 4
  line L10 (-38, -52) -> (-38, 78) construction
  line L11 (-128, 13) -> (52, 13) construction
  circle A13 centre (-121, -45) radius 4
  circle A14 centre (45, 71) radius 4
  circle A15 centre (-121, 71) radius 4
  dimension "d91" = 8
sketch "Sketch10" plane through (0, 0, 0.5) normal (0, 0, -1) x (1, 0, 0)
  line L0 (-20, -21.5) -> (-20, 47.5)
  arc A0 (-16, 51.5) -> (-20, 47.5) centre (-16, 47.5) ccw
  line L1 (-16, 51.5) -> (92, 51.5)
  arc A1 (96, 47.5) -> (92, 51.5) centre (92, 47.5) ccw
  line L2 (96, 47.5) -> (96, -21.5)
  arc A2 (92, -25.5) -> (96, -21.5) centre (92, -21.5) ccw
  line L3 (92, -25.5) -> (-16, -25.5)
  arc A3 (-20, -21.5) -> (-16, -25.5) centre (-16, -21.5) ccw
  line L4 (106.2459, 65.5638) -> (-30.2459, 65.5638)
  arc A4 (-30.2459, 65.5638) -> (-39.5638, 56.2459) centre (-30.2459, 56.2459) ccw
  line L5 (-39.5638, 56.2459) -> (-39.5638, -30.2459)
  arc A5 (-39.5638, -30.2459) -> (-30.2459, -39.5638) centre (-30.2459, -30.2459) ccw
  line L6 (-30.2459, -39.5638) -> (106.2459, -39.5638)
  arc A6 (106.2459, -39.5638) -> (115.5638, -30.2459) centre (106.2459, -30.2459) ccw
  line L7 (115.5638, -30.2459) -> (115.5638, 56.2459)
  arc A7 (115.5638, 56.2459) -> (106.2459, 65.5638) centre (106.2459, 56.2459) ccw
  line L8 (38, 65.5638) -> (38, -39.5638) construction
  line L9 (115.5638, 13) -> (-39.5638, 13) construction
  line L10 (38, 13) -> (-24.24, 13) construction
  line L11 (-23.09, 11) -> (-25.39, 11)
  line L12 (-25.39, 11) -> (-25.39, 15)
  line L13 (-25.39, 15) -> (-23.09, 15)
  line L14 (-23.09, 15) -> (-23.09, 11)
  line L15 (-23.09, 11) -> (-25.39, 15) construction
  line L16 (-25.39, 11) -> (-23.09, 15) construction
  line L17 (38, 13) -> (38, 54) construction
  line L18 (40, 52.85) -> (36, 52.85)
  line L19 (36, 52.85) -> (36, 55.15)
  line L20 (36, 55.15) -> (40, 55.15)
  line L21 (40, 55.15) -> (40, 52.85)
  line L22 (40, 52.85) -> (36, 55.15) construction
  line L23 (36, 52.85) -> (40, 55.15) construction
  line L24 (99.09, 15) -> (99.09, 11)
  line L25 (101.39, 15) -> (99.09, 15)
  line L26 (101.39, 11) -> (101.39, 15)
  line L27 (99.09, 11) -> (101.39, 11)
  line L28 (40, -26.85) -> (36, -26.85)
  line L29 (40, -29.15) -> (40, -26.85)
  line L30 (36, -29.15) -> (40, -29.15)
  line L31 (36, -26.85) -> (36, -29.15)
  point P0 (-24.24, 13)
  point P1 (38, 54)
  dimension "d97" = 62.24
  dimension "d98" = 2.3
  dimension "d99" = 4
  dimension "d100" = 41
  dimension "d101" = 2.3
  dimension "d102" = 4
extrude "Extrude12" add sketch "Sketch10" along normal blind 4.2 contours L11 L12 L13 L14 | L18 L19 L20 L21 | L24 L25 L26 L27 | L28 L29 L30 L31
chamfer "Chamfer2" distance 2.4 angle 45 4 edges at (-47.0977, 45.8136, 6) (118.9023, 45.8136, 6) (118.9023, -70.1864, 6) (-47.0977, -70.1864, 6) measured on face at (111.574, -3.1667, 6) measured on face at (111.574, -3.1667, 6) measured on face at (111.574, -3.1667, 6) measured on face at (111.574, -3.1667, 6)
equation "d3 = Bolt_Diam + 0.5 mm"
equation "ORingDiameter = 1.78 mm" comment "Diamter of the O ring"
equation "ORingInnerDiameter = 170 mm" comment "Inner diamter of the o ring bore"
equation "d25 = ( ORingPerimeter - 100 mm ) / 4 + 50 mm"
equation "ORingPerimeter = 2 * 3.1412 * ( ( ORingInnerDiameter / 2 ) + ORingDiameter / 2 )"
equation "d27 = ( ORingPerimeter - 100 mm ) / 4"
equation "d28 = ( ( ORingDiameter * 1.05 ) / 2 ) + 1.2 mm"
equation "d29 = ( ( ORingDiameter * 1.05 ) / 2 ) + 1.2 mm"
equation "d30 = ( ( ORingDiameter * 1.05 ) / 2 ) + 1.2 mm"
equation "d31 = ( ( ORingDiameter * 1.05 ) / 2 ) + 1.2 mm"
equation "d32 = ORingDiameter * 0.8"
equation "d36 = ( ORingPerimeter - 100 mm ) / 4 + 50 mm"
equation "d37 = ( ORingPerimeter - 100 mm ) / 4"
equation "d38 = ( ORingDiameter * 1.05 ) / 2"
equation "d39 = ( ORingDiameter * 1.05 ) / 2"
equation "d40 = ( ORingDiameter * 1.05 ) / 2"
equation "d41 = ( ORingDiameter * 1.05 ) / 2"
equation "d44 = ( ORingDiameter ) * 6 + ORingDiameter * 0.05 - 1.2 mm"
equation "d45 = ( ORingDiameter ) * 6 + ( ORingDiameter * 1.1 ) + 1.2 mm"
equation "d50 = ( ORingDiameter ) * 6 + ORingDiameter * 0.05 - 0.0 mm"
equation "d51 = ( ORingDiameter ) * 6 + ORingDiameter * 1.1 + 0 mm"
equation "d52 = -( ORingDiameter * 0.8 )"
equation "PanelWidth = 77 mm"
equation "PanelLength = 116 mm"
equation "d58 = PanelLength"
equation "d59 = PanelWidth"
equation "d62 = PanelLength - 10 mm"
equation "d65 = PanelWidth - 10 mm"
equation "d91 = Bolt_Head_Diam"
equation "Bolt_Diam = 4 mm" comment "Diameter of the bolt"
equation "Bolt_Head_Height = 2.3 mm" comment "Height of th ebolt head"
equation "Bolt_Head_Diam = 8 mm" comment "Diamter of the bolt head"
equation "d106 = Bolt_Head_Height + 0.1 mm"
